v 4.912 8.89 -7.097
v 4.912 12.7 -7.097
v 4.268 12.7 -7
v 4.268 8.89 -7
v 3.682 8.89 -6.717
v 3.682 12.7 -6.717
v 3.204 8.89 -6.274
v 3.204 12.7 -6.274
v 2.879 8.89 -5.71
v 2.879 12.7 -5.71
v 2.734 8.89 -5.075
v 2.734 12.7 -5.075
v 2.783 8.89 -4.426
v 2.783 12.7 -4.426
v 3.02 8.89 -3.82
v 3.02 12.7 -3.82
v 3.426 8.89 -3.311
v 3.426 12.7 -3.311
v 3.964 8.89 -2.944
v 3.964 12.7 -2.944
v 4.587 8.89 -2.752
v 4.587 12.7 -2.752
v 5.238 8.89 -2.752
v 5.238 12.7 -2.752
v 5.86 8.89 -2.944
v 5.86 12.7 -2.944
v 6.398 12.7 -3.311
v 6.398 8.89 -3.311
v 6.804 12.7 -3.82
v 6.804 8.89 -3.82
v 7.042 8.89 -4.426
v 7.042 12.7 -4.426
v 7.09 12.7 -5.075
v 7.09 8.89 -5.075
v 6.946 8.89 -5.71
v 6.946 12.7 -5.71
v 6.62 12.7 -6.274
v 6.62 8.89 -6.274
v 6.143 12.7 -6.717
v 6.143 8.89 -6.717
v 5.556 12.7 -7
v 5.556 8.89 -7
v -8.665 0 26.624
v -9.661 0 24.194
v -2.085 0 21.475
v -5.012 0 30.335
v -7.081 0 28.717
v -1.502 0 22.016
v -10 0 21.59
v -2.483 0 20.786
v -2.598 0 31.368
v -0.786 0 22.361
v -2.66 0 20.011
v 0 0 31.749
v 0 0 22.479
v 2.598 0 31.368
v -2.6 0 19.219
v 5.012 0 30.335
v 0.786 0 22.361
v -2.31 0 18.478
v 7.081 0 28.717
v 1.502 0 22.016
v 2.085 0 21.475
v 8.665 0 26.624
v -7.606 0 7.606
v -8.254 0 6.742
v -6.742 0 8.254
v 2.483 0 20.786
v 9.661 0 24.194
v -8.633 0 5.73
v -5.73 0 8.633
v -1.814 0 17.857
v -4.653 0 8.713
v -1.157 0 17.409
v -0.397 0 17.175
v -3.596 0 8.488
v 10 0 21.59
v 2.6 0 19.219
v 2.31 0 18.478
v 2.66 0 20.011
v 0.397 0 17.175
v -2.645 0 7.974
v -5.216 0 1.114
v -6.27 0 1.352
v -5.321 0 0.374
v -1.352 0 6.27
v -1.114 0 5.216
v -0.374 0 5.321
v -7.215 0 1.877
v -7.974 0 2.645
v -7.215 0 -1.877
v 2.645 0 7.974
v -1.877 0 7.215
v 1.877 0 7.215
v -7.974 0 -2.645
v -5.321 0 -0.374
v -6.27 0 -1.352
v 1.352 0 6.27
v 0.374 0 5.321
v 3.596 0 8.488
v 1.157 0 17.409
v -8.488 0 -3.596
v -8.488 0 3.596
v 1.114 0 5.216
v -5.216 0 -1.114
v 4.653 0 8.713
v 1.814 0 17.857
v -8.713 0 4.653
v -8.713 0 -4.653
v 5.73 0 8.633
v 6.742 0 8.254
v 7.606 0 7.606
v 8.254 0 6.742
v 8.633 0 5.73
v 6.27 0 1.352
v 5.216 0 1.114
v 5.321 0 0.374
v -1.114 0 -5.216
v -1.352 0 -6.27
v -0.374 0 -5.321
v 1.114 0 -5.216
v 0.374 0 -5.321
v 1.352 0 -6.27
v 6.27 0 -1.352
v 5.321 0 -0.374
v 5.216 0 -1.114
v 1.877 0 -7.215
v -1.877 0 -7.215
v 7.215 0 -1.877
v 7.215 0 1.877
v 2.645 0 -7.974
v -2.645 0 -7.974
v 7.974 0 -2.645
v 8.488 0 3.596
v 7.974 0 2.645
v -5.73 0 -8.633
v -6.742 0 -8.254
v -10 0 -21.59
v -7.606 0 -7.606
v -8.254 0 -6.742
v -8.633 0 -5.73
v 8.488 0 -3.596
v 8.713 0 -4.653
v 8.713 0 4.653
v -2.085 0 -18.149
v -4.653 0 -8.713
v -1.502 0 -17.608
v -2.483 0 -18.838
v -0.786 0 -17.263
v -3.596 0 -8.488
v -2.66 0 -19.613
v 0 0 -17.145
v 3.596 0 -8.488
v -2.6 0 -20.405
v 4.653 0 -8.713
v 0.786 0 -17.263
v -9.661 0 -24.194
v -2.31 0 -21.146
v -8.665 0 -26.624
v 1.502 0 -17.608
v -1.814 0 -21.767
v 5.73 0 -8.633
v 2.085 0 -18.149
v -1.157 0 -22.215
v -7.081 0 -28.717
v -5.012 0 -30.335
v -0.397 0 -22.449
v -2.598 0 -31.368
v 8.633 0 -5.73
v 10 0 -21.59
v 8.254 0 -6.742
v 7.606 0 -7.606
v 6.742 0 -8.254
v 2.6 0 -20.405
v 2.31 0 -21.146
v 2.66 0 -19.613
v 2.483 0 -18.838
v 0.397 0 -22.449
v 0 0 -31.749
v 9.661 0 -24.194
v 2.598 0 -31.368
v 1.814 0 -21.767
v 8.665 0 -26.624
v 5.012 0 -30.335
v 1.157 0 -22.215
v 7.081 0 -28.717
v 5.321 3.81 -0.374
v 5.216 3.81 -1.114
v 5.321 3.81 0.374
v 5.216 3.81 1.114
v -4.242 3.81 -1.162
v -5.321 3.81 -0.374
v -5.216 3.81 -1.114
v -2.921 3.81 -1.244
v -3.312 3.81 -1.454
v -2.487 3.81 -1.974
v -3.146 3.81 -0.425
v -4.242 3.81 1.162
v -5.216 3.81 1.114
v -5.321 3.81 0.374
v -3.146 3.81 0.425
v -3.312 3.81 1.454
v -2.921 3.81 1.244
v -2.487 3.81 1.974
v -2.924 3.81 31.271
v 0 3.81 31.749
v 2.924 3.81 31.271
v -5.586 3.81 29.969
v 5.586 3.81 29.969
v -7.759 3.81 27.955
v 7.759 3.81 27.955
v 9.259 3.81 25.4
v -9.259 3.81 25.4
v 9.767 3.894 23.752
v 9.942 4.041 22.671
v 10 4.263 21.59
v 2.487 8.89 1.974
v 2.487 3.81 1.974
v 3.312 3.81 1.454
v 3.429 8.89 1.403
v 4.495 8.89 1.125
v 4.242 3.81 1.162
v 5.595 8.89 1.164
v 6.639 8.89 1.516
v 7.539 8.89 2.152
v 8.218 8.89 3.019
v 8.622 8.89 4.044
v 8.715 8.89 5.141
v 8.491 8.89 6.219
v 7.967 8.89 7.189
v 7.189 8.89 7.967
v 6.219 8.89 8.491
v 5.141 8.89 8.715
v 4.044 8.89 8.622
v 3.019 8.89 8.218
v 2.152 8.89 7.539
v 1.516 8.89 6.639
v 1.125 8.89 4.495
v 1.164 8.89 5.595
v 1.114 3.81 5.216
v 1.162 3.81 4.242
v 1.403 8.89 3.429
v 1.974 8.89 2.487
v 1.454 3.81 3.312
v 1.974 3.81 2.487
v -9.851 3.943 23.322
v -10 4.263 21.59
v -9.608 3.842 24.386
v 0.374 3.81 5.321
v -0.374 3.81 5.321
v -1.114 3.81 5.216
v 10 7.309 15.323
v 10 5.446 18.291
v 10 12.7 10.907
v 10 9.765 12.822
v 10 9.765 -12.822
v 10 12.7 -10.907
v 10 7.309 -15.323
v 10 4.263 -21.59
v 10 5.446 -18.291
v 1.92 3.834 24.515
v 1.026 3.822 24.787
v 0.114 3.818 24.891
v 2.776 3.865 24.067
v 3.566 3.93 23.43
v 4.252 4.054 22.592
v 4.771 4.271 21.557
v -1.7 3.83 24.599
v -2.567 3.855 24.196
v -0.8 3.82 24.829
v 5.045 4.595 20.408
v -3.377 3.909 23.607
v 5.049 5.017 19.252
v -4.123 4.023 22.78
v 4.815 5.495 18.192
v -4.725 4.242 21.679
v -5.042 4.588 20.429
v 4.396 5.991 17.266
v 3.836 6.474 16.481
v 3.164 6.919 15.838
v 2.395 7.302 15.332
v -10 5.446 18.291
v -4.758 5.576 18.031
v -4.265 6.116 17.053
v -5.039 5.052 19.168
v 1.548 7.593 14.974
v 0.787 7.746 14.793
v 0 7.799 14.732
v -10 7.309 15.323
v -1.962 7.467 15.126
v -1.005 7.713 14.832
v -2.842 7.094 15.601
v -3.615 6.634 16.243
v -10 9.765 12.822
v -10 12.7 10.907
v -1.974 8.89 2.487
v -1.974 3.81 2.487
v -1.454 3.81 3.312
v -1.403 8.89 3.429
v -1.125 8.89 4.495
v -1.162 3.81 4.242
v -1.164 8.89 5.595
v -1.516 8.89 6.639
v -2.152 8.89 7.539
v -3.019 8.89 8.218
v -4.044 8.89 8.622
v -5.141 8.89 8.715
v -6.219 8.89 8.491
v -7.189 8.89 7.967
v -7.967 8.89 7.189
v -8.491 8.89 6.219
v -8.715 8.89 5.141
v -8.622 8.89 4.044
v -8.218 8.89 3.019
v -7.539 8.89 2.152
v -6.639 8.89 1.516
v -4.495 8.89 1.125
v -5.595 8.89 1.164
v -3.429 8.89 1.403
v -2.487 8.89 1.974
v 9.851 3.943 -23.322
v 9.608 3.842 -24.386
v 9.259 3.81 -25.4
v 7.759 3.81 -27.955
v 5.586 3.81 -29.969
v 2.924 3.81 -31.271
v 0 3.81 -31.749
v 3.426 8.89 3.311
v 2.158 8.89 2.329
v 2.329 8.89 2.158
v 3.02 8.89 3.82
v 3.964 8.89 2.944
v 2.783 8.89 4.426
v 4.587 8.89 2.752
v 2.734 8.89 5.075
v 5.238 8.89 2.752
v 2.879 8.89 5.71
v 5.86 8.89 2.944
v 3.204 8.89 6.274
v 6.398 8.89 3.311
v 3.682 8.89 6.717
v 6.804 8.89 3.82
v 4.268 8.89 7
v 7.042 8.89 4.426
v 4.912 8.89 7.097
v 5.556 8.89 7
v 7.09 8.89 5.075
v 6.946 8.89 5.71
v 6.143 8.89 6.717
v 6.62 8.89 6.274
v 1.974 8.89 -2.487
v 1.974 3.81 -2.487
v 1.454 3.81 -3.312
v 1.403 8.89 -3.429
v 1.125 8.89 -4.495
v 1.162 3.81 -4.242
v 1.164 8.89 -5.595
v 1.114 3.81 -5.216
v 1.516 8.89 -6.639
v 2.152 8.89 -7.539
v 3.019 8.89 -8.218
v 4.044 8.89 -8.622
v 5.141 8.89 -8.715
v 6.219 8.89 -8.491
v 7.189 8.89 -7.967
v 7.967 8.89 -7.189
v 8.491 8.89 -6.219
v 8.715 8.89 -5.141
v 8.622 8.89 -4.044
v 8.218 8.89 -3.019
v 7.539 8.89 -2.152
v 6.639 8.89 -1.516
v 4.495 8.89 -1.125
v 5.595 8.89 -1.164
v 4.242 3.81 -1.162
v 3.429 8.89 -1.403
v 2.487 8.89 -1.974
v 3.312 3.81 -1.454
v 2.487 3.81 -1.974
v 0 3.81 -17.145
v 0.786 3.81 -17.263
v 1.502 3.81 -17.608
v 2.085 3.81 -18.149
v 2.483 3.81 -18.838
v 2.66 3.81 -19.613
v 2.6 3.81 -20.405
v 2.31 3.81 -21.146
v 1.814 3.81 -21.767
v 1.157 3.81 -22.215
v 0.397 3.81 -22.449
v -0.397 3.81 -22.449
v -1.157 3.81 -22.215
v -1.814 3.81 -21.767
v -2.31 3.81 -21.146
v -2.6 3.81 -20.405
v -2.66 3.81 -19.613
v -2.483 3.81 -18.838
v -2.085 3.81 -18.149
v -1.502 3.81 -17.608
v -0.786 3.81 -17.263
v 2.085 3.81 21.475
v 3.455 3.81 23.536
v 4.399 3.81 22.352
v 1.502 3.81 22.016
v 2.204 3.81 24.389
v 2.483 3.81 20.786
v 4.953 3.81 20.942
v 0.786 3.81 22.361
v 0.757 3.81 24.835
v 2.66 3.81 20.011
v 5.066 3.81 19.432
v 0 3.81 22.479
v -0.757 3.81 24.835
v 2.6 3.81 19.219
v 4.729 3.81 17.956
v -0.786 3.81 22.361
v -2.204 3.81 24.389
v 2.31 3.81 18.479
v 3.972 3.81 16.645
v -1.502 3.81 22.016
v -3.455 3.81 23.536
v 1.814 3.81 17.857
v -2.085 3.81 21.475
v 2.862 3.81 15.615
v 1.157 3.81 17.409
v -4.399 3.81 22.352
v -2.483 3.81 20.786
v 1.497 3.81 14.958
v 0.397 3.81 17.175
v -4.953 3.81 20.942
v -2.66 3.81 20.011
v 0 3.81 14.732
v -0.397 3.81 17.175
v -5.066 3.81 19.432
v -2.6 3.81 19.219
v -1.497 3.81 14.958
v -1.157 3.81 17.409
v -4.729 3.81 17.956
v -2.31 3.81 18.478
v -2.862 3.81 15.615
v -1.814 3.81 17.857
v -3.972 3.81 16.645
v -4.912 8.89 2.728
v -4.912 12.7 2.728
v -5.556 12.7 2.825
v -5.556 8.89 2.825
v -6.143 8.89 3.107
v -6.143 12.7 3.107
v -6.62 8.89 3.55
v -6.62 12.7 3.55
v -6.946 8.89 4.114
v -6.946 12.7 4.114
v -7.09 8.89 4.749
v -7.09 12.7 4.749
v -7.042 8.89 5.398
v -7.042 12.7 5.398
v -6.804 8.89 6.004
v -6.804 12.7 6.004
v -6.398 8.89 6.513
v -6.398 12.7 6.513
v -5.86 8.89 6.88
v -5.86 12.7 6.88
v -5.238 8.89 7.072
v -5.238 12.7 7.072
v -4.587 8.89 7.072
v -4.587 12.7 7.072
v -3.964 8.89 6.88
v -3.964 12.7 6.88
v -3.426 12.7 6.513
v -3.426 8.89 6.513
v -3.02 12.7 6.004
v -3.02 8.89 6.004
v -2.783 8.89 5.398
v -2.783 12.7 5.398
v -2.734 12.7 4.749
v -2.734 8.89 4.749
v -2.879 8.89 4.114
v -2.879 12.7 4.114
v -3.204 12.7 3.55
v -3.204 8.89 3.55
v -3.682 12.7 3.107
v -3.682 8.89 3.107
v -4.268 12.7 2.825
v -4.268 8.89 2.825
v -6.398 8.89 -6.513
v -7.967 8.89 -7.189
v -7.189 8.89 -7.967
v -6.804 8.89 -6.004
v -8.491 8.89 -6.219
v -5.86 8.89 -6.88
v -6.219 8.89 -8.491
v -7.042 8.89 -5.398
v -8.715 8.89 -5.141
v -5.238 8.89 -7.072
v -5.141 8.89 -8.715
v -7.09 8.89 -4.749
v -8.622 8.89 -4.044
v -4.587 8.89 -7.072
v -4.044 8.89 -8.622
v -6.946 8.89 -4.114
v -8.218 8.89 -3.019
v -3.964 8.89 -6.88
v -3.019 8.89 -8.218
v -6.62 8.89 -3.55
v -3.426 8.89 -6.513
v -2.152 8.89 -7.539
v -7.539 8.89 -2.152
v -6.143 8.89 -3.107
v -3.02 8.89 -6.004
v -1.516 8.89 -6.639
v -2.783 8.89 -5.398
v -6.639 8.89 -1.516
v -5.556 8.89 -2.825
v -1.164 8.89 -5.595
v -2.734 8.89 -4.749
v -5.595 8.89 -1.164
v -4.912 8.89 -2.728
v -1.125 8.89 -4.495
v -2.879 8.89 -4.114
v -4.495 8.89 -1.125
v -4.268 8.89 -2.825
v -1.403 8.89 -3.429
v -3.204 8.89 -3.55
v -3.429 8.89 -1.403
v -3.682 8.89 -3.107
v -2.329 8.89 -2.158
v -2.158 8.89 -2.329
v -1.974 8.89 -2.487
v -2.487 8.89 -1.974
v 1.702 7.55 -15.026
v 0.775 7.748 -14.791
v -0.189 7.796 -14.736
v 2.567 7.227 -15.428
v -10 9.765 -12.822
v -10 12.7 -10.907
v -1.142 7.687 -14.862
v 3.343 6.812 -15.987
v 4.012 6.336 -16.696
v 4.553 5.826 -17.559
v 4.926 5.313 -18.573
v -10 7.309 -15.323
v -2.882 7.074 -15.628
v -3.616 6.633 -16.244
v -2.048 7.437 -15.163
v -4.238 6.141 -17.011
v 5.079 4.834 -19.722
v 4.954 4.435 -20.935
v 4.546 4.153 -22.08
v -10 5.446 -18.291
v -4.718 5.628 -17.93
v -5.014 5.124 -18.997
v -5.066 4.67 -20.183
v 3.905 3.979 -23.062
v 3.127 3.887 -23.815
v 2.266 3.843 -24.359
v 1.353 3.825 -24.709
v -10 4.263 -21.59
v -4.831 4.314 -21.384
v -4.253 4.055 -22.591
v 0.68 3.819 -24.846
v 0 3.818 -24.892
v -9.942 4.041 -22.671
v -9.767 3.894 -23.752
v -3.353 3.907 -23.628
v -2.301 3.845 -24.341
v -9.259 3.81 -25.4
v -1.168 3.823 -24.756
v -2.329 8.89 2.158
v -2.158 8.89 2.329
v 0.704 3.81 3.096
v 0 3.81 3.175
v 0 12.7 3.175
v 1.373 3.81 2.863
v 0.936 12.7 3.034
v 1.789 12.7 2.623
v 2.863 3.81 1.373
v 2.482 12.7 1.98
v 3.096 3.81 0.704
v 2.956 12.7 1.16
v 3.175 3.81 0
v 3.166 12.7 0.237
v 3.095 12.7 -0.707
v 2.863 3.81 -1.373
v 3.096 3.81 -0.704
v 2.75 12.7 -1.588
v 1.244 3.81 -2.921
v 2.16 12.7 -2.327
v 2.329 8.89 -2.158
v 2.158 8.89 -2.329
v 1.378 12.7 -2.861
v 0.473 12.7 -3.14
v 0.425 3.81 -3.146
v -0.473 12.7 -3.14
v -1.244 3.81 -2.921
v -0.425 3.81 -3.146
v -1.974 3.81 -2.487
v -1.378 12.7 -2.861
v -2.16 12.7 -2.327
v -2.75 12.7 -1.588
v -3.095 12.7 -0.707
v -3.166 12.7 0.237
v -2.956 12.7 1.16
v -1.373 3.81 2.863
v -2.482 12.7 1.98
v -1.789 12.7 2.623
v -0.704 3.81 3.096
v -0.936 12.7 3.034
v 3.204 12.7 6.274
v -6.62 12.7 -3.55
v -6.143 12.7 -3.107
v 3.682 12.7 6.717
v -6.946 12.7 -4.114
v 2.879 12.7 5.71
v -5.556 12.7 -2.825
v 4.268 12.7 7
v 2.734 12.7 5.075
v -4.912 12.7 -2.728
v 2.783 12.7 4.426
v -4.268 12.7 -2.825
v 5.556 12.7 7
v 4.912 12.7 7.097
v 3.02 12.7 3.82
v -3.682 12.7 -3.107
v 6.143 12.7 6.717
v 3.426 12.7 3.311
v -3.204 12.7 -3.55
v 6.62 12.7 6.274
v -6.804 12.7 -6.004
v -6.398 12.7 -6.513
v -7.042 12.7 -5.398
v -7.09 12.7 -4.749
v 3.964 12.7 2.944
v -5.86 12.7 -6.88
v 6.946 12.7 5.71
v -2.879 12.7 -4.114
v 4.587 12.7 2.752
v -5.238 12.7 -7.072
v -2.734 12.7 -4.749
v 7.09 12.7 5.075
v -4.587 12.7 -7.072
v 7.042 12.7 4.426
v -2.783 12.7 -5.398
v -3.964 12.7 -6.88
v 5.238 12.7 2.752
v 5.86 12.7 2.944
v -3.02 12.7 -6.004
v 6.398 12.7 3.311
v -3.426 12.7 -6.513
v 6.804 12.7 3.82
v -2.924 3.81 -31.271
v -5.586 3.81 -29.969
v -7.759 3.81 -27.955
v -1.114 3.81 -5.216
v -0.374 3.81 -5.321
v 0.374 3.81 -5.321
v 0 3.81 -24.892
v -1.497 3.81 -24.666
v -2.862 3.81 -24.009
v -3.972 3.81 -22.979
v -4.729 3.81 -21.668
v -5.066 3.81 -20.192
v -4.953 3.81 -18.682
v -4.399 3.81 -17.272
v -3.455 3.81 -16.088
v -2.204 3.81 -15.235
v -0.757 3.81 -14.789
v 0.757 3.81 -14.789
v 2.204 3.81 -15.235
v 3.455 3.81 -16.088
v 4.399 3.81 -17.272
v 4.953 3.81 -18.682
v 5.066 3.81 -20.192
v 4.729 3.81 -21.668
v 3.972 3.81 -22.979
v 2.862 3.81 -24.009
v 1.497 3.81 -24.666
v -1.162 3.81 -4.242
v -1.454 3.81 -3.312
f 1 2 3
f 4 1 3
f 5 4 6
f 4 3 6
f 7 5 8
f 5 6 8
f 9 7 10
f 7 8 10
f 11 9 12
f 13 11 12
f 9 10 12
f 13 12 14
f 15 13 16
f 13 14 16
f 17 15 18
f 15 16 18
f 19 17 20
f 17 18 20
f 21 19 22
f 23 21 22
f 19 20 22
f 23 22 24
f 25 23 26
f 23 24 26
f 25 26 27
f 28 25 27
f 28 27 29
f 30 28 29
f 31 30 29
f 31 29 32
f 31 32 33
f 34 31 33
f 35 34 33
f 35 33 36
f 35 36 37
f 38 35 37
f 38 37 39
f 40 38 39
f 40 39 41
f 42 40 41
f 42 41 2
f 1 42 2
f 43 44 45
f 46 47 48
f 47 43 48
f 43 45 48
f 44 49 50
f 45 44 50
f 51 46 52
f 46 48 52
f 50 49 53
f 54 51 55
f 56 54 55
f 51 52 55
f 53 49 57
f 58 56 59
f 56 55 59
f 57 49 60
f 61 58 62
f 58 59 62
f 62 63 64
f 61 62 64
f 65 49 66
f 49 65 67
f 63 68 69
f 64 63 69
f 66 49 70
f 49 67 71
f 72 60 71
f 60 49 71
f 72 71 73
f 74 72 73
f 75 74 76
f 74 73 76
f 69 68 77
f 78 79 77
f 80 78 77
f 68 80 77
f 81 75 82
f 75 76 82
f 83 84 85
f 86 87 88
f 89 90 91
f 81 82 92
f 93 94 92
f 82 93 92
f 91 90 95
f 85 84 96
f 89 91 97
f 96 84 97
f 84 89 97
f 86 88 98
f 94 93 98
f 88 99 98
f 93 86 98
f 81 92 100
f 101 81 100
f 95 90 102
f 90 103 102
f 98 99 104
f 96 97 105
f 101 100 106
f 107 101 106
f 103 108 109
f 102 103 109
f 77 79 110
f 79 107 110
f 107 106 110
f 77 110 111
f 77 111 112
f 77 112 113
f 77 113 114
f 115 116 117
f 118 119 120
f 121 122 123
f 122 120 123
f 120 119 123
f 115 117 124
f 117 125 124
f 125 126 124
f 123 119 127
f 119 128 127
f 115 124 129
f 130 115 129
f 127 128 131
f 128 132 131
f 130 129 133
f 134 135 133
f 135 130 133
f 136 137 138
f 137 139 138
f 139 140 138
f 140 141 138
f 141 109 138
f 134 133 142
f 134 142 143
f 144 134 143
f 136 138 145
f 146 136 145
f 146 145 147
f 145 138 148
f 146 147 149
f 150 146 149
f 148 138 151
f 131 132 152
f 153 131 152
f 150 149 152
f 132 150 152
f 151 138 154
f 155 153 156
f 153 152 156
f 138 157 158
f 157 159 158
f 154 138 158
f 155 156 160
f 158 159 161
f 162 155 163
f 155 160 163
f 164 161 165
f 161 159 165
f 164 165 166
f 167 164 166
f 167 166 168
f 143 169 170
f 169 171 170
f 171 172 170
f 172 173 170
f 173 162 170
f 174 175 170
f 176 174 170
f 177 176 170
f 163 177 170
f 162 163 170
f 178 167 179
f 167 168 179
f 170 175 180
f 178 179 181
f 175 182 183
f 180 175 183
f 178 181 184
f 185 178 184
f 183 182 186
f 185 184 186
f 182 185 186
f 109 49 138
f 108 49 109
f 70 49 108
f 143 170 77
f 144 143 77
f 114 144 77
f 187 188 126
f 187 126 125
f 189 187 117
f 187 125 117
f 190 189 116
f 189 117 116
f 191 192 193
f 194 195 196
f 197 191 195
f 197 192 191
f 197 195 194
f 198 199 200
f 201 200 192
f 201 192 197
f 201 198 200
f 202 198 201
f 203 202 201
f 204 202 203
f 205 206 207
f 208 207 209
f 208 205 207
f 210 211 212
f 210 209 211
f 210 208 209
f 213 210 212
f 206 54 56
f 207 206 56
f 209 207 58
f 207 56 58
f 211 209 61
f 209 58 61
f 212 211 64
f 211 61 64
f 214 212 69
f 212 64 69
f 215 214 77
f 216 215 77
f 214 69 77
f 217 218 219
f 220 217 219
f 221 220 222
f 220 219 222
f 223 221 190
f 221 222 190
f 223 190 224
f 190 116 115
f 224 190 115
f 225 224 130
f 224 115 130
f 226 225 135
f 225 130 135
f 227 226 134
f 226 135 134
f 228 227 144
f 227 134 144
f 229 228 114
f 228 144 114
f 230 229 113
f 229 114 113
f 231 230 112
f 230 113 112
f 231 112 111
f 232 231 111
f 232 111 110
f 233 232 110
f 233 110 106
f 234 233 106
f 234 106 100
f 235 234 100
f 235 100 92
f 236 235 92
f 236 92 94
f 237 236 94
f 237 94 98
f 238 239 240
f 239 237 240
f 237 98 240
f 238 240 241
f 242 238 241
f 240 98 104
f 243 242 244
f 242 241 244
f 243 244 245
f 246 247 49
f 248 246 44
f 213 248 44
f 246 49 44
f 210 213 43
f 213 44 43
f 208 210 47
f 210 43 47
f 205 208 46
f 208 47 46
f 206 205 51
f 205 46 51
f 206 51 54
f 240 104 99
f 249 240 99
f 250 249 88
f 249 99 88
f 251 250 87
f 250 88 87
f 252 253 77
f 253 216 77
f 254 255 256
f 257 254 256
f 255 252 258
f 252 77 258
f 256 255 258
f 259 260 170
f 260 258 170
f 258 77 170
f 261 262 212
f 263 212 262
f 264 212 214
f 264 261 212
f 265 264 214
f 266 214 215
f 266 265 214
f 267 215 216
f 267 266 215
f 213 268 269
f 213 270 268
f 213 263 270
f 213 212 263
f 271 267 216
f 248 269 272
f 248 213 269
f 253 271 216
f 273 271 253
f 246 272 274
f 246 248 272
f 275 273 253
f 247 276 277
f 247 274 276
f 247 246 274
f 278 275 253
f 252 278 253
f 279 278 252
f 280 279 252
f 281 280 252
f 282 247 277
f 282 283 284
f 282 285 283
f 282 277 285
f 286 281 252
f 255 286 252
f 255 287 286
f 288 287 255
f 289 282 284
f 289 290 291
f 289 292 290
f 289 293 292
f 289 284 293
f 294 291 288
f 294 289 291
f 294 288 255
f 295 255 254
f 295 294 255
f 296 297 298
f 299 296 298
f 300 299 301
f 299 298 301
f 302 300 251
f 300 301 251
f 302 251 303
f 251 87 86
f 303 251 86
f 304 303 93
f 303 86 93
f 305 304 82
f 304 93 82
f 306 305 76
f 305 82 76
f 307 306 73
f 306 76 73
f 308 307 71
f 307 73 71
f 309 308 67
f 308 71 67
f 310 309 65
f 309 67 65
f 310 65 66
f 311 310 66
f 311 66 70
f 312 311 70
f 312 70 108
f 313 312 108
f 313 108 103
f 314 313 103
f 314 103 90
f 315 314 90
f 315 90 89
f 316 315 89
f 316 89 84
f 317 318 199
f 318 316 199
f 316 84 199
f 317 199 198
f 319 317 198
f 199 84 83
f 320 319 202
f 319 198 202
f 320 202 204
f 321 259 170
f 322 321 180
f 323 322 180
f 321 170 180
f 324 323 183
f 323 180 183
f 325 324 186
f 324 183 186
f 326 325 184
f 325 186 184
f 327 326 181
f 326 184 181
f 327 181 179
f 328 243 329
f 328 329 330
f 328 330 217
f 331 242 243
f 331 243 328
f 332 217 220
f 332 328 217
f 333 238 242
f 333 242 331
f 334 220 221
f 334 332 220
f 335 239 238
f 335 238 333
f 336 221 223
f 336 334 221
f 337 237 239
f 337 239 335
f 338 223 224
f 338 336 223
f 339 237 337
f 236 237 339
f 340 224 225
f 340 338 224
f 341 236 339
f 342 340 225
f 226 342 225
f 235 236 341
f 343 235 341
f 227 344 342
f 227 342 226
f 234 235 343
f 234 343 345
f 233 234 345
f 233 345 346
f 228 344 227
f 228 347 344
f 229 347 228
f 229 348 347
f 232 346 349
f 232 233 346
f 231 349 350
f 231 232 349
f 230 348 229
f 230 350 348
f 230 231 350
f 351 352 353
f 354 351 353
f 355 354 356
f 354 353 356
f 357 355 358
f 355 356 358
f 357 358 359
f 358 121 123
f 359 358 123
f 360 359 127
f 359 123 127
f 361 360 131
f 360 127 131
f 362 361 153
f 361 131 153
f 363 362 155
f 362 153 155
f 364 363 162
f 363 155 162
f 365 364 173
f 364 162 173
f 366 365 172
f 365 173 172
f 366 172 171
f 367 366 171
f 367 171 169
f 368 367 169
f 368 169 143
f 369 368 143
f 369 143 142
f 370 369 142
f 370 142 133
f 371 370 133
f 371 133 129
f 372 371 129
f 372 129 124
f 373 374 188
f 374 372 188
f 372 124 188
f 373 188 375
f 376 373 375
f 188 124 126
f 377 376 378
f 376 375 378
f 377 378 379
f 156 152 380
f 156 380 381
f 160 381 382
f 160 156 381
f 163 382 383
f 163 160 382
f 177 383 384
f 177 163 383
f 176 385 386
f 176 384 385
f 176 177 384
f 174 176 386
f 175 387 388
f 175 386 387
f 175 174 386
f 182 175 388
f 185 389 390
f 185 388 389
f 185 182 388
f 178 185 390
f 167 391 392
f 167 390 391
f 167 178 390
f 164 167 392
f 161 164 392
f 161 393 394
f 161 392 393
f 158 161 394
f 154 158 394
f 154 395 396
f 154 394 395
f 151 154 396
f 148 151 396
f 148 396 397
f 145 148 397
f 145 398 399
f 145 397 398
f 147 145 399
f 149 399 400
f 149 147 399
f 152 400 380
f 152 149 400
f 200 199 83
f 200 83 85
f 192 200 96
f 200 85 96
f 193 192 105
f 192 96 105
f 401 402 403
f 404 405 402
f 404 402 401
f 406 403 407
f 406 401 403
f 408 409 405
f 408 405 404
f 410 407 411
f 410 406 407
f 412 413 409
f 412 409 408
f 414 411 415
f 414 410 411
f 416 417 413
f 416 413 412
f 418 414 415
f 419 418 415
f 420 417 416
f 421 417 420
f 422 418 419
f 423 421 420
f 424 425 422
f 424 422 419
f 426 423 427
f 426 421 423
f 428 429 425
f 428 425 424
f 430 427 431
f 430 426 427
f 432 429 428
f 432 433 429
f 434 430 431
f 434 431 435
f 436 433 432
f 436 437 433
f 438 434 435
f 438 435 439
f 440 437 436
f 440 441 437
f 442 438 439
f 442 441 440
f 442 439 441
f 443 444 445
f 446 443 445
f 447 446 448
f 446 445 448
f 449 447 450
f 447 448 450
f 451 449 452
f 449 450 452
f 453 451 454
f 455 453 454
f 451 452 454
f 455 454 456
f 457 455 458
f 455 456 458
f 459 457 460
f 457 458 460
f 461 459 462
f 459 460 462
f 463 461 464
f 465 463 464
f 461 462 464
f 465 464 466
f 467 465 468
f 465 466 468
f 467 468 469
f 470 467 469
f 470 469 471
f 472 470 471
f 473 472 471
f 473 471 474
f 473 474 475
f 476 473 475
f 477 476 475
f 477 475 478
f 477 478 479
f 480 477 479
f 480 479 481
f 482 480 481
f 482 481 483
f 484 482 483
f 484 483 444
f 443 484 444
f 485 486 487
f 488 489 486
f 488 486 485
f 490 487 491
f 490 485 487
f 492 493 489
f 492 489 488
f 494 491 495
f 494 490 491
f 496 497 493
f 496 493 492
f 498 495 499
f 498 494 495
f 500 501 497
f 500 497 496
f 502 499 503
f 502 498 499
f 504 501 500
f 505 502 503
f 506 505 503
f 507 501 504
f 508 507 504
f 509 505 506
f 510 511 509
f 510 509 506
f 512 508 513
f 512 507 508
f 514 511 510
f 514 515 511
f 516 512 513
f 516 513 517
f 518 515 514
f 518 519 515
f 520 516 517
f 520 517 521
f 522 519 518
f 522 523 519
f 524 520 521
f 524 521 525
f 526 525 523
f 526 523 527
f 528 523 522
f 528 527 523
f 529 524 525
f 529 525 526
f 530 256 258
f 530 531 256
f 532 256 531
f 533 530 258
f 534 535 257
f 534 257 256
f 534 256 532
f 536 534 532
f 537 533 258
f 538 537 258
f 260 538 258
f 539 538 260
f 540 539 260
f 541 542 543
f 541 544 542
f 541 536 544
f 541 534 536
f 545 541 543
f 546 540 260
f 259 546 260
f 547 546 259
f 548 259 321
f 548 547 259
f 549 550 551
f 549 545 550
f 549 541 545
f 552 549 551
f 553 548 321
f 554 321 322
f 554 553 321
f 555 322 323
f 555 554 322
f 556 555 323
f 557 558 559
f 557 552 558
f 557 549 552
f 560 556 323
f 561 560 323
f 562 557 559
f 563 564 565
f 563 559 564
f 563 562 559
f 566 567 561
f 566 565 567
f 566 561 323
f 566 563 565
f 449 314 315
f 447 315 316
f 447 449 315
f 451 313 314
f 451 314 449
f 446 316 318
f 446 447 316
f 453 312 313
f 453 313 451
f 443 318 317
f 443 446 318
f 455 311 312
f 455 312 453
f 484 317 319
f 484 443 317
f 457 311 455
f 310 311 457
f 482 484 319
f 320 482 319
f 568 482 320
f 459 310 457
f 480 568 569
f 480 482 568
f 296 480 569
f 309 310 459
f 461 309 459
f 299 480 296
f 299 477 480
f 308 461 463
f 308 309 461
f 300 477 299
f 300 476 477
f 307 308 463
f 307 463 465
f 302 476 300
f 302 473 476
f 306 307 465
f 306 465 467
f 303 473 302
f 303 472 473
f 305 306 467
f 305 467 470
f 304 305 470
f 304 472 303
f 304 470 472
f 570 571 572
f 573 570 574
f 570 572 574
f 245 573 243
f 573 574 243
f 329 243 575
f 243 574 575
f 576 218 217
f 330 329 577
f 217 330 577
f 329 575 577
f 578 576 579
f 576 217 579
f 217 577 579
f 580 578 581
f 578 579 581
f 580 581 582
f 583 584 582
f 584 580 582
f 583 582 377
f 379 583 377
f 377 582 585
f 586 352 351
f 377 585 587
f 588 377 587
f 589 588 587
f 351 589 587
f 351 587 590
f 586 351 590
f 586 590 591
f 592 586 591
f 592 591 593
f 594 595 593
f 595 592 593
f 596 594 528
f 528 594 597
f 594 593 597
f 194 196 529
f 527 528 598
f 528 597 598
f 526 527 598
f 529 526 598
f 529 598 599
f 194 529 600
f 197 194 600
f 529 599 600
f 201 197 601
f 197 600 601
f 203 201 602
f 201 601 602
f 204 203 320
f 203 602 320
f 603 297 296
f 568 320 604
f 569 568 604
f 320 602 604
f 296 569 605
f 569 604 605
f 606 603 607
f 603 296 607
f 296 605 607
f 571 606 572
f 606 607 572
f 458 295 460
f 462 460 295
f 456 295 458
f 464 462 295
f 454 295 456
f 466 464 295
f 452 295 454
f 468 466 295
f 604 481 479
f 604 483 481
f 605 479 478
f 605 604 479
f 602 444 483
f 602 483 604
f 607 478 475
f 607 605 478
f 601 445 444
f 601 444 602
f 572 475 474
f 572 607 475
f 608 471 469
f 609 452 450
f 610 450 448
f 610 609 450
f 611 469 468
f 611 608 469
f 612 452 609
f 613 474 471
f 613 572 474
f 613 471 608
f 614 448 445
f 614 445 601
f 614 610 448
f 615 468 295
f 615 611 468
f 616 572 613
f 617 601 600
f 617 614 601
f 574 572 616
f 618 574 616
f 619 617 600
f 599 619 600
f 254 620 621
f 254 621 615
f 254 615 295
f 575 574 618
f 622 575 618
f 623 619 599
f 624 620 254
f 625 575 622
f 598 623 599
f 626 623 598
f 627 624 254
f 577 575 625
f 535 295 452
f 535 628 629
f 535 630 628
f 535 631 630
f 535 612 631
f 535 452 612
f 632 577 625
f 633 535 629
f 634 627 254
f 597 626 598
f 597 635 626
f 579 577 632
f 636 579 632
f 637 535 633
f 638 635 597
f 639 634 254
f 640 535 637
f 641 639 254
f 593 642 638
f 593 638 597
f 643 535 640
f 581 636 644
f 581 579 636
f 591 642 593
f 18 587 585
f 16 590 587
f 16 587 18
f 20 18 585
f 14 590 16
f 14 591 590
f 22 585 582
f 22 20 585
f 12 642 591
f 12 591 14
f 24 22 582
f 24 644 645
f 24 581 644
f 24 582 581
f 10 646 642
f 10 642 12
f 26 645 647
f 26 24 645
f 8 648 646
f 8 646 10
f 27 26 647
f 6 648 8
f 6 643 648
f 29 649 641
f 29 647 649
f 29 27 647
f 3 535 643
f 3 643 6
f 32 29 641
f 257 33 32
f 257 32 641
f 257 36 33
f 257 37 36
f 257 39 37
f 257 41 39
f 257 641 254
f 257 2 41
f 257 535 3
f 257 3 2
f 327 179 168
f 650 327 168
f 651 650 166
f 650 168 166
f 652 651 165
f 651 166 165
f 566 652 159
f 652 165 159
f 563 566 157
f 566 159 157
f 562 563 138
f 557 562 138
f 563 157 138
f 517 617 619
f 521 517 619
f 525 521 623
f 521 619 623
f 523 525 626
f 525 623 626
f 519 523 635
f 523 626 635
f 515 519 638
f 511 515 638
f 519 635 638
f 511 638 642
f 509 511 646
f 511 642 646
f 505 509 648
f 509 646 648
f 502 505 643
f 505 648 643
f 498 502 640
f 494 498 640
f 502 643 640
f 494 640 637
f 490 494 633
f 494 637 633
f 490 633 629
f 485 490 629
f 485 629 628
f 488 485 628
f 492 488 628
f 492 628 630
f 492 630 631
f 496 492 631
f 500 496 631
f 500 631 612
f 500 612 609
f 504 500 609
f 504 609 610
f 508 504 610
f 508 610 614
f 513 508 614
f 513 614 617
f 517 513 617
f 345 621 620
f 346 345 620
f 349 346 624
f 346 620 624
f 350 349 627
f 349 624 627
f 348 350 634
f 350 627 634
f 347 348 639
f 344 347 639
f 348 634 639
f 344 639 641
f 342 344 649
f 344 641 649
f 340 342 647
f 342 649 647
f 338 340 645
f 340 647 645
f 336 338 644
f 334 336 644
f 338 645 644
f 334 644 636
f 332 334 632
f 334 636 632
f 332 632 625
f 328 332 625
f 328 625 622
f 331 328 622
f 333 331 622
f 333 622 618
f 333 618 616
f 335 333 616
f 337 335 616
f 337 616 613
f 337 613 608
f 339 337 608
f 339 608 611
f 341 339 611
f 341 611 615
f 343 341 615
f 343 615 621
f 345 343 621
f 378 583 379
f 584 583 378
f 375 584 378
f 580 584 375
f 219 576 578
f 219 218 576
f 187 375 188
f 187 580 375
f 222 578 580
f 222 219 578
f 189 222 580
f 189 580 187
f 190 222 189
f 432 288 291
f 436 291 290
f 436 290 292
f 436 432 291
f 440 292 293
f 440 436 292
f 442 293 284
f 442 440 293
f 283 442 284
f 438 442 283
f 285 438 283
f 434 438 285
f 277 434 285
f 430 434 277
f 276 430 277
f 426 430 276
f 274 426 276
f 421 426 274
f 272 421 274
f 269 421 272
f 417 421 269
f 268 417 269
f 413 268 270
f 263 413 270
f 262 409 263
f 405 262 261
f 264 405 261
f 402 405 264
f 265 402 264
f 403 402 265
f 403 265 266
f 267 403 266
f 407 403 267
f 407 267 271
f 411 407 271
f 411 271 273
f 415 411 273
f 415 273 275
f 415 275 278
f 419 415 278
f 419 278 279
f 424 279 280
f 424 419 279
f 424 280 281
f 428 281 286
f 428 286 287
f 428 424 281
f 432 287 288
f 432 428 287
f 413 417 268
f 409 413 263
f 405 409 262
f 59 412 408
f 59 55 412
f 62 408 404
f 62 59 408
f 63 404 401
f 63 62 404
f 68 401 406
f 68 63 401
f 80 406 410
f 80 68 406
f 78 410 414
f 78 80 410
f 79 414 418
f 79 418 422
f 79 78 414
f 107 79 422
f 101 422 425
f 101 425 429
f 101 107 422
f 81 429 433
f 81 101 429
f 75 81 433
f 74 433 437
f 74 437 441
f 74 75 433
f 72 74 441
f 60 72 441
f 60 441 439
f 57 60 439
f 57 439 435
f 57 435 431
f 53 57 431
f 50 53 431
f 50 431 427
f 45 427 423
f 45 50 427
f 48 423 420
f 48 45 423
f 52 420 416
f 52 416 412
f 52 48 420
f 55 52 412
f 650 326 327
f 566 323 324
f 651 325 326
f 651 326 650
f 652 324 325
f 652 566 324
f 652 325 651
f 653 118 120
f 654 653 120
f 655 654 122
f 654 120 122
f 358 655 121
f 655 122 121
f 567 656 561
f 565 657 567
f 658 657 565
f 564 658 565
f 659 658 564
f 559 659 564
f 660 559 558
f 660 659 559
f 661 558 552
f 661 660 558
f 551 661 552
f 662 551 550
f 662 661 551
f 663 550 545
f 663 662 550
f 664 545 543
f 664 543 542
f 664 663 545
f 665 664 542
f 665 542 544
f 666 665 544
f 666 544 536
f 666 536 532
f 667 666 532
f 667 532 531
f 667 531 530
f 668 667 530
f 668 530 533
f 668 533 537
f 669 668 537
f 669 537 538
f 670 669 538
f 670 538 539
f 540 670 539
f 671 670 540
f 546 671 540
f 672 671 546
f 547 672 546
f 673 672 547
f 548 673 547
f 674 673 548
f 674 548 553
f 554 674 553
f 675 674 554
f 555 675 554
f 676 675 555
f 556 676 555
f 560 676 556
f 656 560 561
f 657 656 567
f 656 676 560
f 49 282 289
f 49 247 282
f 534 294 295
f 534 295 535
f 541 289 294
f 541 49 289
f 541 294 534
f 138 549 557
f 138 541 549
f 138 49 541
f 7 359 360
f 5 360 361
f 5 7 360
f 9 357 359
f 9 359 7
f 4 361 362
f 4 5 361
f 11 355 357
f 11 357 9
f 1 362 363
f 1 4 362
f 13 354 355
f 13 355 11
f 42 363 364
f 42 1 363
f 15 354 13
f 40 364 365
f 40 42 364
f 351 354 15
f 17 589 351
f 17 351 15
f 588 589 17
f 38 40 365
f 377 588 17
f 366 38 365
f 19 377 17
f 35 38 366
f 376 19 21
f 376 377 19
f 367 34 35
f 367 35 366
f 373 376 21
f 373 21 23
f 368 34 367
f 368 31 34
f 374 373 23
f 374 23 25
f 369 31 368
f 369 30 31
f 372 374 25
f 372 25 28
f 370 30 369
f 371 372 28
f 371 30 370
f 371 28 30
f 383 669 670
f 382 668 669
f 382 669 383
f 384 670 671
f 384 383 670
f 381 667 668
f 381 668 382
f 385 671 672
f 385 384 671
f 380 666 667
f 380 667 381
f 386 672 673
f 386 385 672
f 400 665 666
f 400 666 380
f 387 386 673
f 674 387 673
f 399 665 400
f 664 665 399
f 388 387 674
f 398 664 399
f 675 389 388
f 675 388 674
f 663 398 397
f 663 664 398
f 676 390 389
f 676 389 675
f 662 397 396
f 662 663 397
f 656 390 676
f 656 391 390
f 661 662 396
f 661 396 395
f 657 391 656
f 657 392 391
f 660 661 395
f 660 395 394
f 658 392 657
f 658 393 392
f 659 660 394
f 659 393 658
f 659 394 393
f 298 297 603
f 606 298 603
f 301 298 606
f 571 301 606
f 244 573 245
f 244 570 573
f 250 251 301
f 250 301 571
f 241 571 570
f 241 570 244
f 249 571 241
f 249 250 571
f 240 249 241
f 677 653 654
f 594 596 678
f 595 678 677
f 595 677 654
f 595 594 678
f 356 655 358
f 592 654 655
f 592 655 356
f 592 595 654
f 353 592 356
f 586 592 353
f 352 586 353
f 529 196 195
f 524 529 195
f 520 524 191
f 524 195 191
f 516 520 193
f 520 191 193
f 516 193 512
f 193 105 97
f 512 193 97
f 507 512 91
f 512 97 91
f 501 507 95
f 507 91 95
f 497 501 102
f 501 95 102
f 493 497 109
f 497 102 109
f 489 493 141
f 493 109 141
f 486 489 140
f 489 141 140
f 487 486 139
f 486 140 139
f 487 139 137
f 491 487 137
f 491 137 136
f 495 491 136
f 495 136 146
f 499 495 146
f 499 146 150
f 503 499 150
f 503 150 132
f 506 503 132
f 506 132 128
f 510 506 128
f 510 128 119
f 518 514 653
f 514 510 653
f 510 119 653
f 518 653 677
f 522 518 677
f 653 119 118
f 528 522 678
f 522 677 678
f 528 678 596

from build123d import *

# Parameters (mm, degrees)
SKETCH1_W               = 20
SKETCH1_H               = 63.5
BOSS_EXTRUDE1_DEPTH     = 12.7
SKETCH2_R               = 3.175
SKETCH2_R_2             = 2.1844
CUT_EXTRUDE1_DEPTH      = 36.62797356
CUT_EXTRUDE2_DEPTH      = 36.62797356
CUT_EXTRUDE2_DEPTH_BACK = 36.62797356
SKETCH4_R               = 3.81
CUT_EXTRUDE3_DEPTH      = 8.89
SKETCH4_3_R             = 3.81
SKETCH4_3_R_2           = 2.1844
SKETCH4_3_R_3           = 5.334
SKETCH4_3_R_4           = 3.175
CUT_EXTRUDE4_DEPTH      = 3.81
CUT_EXTRUDE5_REACH      = 36.454
SKETCH6_R               = 5.08
SKETCH6_R_2             = 2.667
CUT_EXTRUDE6_DEPTH      = 10
CUT_EXTRUDE6_DEPTH_BACK = 35.454239272
SKETCH6_4_R             = 2.159
SKETCH6_4_R_2           = 2.667
FILLET1_R               = 10.16


with BuildPart() as part:
    # Sketch1 → Boss-Extrude1 (new body)
    with BuildSketch(Plane(origin=(0, 0, 0), x_dir=(1, 0, 0), z_dir=(0, 1, 0))):
        Rectangle(SKETCH1_W, SKETCH1_H)
    extrude(amount=BOSS_EXTRUDE1_DEPTH)

    # Sketch2 → Cut-Extrude1 (cut, through all)
    with BuildSketch(Plane(origin=(0, 12.7, 0), x_dir=(1, 0, 0), z_dir=(0, 1, 0))):
        with Locations(Location((0, 0, 0), (0, 0, 270))):
            Circle(SKETCH2_R)
        with Locations(Location((-4.912200098, 4.912200098, 0), (0, 0, 270))):
            Circle(SKETCH2_R_2)
        with Locations(Location((4.912200098, -4.912200098, 0), (0, 0, 270))):
            Circle(SKETCH2_R_2)
        with Locations(Location((4.912200098, 4.912200098, 0), (0, 0, 90))):
            Circle(SKETCH2_R_2)
        with Locations(Location((-4.912200098, -4.912200098, 0), (0, 0, 90))):
            Circle(SKETCH2_R_2)
    extrude(amount=-CUT_EXTRUDE1_DEPTH, mode=Mode.SUBTRACT)

    # Sketch3 → Cut-Extrude2 (cut, two sides: drawn at the far end of the back side and taken through both)
    with BuildSketch(Plane(origin=(0, 0, 0), x_dir=(0, 0, -1), z_dir=(1, 0, 0)).offset(-CUT_EXTRUDE2_DEPTH_BACK)):
        with BuildLine():
            Line((31.75, 3.81), (31.75, 12.7))
            Line((31.75, 12.7), (10.906600098, 12.7))
            ThreePointArc((10.906600098, 12.7), (16.898665682, 6.209564949), (25.4, 3.81))
            Line((25.4, 3.81), (31.75, 3.81))
        make_face()
        with BuildLine():
            ThreePointArc((-25.4, 3.81), (-16.898665682, 6.209564949), (-10.906600098, 12.7))
            Line((-10.906600098, 12.7), (-31.75, 12.7))
            Line((-31.75, 12.7), (-31.75, 3.81))
            Line((-31.75, 3.81), (-25.4, 3.81))
        make_face()
    extrude(amount=CUT_EXTRUDE2_DEPTH + CUT_EXTRUDE2_DEPTH_BACK, mode=Mode.SUBTRACT)

    # Sketch4 → Cut-Extrude3 (cut)
    with BuildSketch(Plane.XZ):
        with Locations((-4.912200098, -4.912200098)):
            Circle(SKETCH4_R)
        with Locations((4.912200098, 4.912200098)):
            Circle(SKETCH4_R)
        with Locations((-4.912200098, 4.912200098)):
            Circle(SKETCH4_R)
        with Locations((4.912200098, -4.912200098)):
            Circle(SKETCH4_R)
    extrude(amount=-CUT_EXTRUDE3_DEPTH, mode=Mode.SUBTRACT)

    # Sketch4<3> → Cut-Extrude4 (cut)
    # profile 1 of 28: a face of its own
    with BuildSketch(Plane.XZ):
        with Locations((-4.912200098, 4.912200098)):
            Circle(SKETCH4_3_R)
        with Locations(Location((-4.912200098, 4.912200098, 0), (0, 0, 270))):
            Circle(SKETCH4_3_R_2, mode=Mode.SUBTRACT)
    # profile 2 of 28: a face of its own
    with BuildSketch(Plane.XZ):
        Circle(SKETCH4_3_R_3)
        with Locations(Location((0, 0, 0), (0, 0, 90))):
            Circle(SKETCH4_3_R_4, mode=Mode.SUBTRACT)
    # profile 3 of 28: a face of its own
    with BuildSketch(Plane.XZ):
        Circle(SKETCH4_3_R_3)
    # profile 4 of 28: a face of its own
    with BuildSketch(Plane.XZ):
        with Locations(Location((-4.912200098, 4.912200098, 0), (0, 0, 270))):
            Circle(SKETCH4_3_R_2)
    # profile 5 of 28: a face of its own
    with BuildSketch(Plane.XZ):
        with Locations((-4.912200098, 4.912200098)):
            Circle(SKETCH4_3_R)
    # profile 6 of 28: a face of its own
    with BuildSketch(Plane.XZ):
        Circle(SKETCH4_3_R_3)
        with Locations(Location((0, 0, 0), (0, 0, 90))):
            Circle(SKETCH4_3_R_4, mode=Mode.SUBTRACT)
    # profile 7 of 28: a face of its own
    with BuildSketch(Plane.XZ):
        with Locations((-4.912200098, -4.912200098)):
            Circle(SKETCH4_3_R)
    # profile 8 of 28: a face of its own
    with BuildSketch(Plane.XZ):
        Circle(SKETCH4_3_R_3)
        with Locations(Location((0, 0, 0), (0, 0, 90))):
            Circle(SKETCH4_3_R_4, mode=Mode.SUBTRACT)
    # profile 9 of 28: a face of its own
    with BuildSketch(Plane.XZ):
        with Locations((-4.912200098, -4.912200098)):
            Circle(SKETCH4_3_R)
        with Locations(Location((-4.912200098, -4.912200098, 0), (0, 0, 90))):
            Circle(SKETCH4_3_R_2, mode=Mode.SUBTRACT)
    # profile 10 of 28: a face of its own
    with BuildSketch(Plane.XZ):
        Circle(SKETCH4_3_R_3)
    # profile 11 of 28: a face of its own
    with BuildSketch(Plane.XZ):
        with Locations(Location((-4.912200098, -4.912200098, 0), (0, 0, 90))):
            Circle(SKETCH4_3_R_2)
    # profile 12 of 28: a face of its own
    with BuildSketch(Plane.XZ):
        with BuildLine():
            ThreePointArc((1.973854475, -2.486870224), (1.04518229, -2.998035854), (0, -3.175))
            Line((0, -3.175), (0, -5.334))
            ThreePointArc((0, -5.334), (0.560277089, -5.304492962), (1.114355409, -5.216298306))
            ThreePointArc((1.114355409, -5.216298306), (1.278123958, -3.767826643), (1.973854475, -2.486870224))
        make_face()
    # profile 13 of 28: a face of its own
    with BuildSketch(Plane.XZ):
        with BuildLine():
            Line((0, -5.334), (0, -3.175))
            ThreePointArc((0, -3.175), (-1.04518229, -2.998035854), (-1.973854475, -2.486870224))
            ThreePointArc((-1.973854475, -2.486870224), (-1.326729639, -3.623595587), (-1.102200098, -4.912200098))
            ThreePointArc((-1.102200098, -4.912200098), (-1.105240139, -5.064370621), (-1.114355409, -5.216298306))
            ThreePointArc((-1.114355409, -5.216298306), (-0.560277089, -5.304492962), (0, -5.334))
        make_face()
    # profile 14 of 28: a face of its own
    with BuildSketch(Plane.XZ):
        with Locations((4.912200098, -4.912200098)):
            Circle(SKETCH4_3_R)
        with Locations(Location((4.912200098, -4.912200098, 0), (0, 0, 270))):
            Circle(SKETCH4_3_R_2, mode=Mode.SUBTRACT)
    # profile 15 of 28: a face of its own
    with BuildSketch(Plane.XZ):
        Circle(SKETCH4_3_R_3)
        with Locations(Location((0, 0, 0), (0, 0, 90))):
            Circle(SKETCH4_3_R_4, mode=Mode.SUBTRACT)
    # profile 16 of 28: a face of its own
    with BuildSketch(Plane.XZ):
        Circle(SKETCH4_3_R_3)
    # profile 17 of 28: a face of its own
    with BuildSketch(Plane.XZ):
        with Locations(Location((4.912200098, -4.912200098, 0), (0, 0, 270))):
            Circle(SKETCH4_3_R_2)
    # profile 18 of 28: a face of its own
    with BuildSketch(Plane.XZ):
        with Locations((4.912200098, -4.912200098)):
            Circle(SKETCH4_3_R)
    # profile 19 of 28: a face of its own
    with BuildSketch(Plane.XZ):
        Circle(SKETCH4_3_R_3)
        with Locations(Location((0, 0, 0), (0, 0, 90))):
            Circle(SKETCH4_3_R_4, mode=Mode.SUBTRACT)
    # profile 20 of 28: a face of its own
    with BuildSketch(Plane.XZ):
        with Locations((4.912200098, 4.912200098)):
            Circle(SKETCH4_3_R)
    # profile 21 of 28: a face of its own
    with BuildSketch(Plane.XZ):
        Circle(SKETCH4_3_R_3)
        with Locations(Location((0, 0, 0), (0, 0, 90))):
            Circle(SKETCH4_3_R_4, mode=Mode.SUBTRACT)
    # profile 22 of 28: a face of its own
    with BuildSketch(Plane.XZ):
        with Locations((4.912200098, 4.912200098)):
            Circle(SKETCH4_3_R)
        with Locations(Location((4.912200098, 4.912200098, 0), (0, 0, 90))):
            Circle(SKETCH4_3_R_2, mode=Mode.SUBTRACT)
    # profile 23 of 28: a face of its own
    with BuildSketch(Plane.XZ):
        Circle(SKETCH4_3_R_3)
    # profile 24 of 28: a face of its own
    with BuildSketch(Plane.XZ):
        with Locations(Location((4.912200098, 4.912200098, 0), (0, 0, 90))):
            Circle(SKETCH4_3_R_2)
    # profile 25 of 28: a face of its own
    with BuildSketch(Plane.XZ):
        with BuildLine():
            Line((0, 3.175), (0, 5.334))
            ThreePointArc((0, 5.334), (-0.560277089, 5.304492962), (-1.114355409, 5.216298306))
            ThreePointArc((-1.114355409, 5.216298306), (-1.105240139, 5.064370621), (-1.102200098, 4.912200098))
            ThreePointArc((-1.102200098, 4.912200098), (-1.326729639, 3.623595587), (-1.973854475, 2.486870224))
            ThreePointArc((-1.973854475, 2.486870224), (-1.04518229, 2.998035854), (0, 3.175))
        make_face()
    # profile 26 of 28: a face of its own
    with BuildSketch(Plane.XZ):
        with BuildLine():
            ThreePointArc((1.114355409, 5.216298306), (0.560277089, 5.304492962), (0, 5.334))
            Line((0, 5.334), (0, 3.175))
            ThreePointArc((0, 3.175), (1.04518229, 2.998035854), (1.973854475, 2.486870224))
            ThreePointArc((1.973854475, 2.486870224), (1.278123958, 3.767826643), (1.114355409, 5.216298306))
        make_face()
    # profile 27 of 28: a face of its own
    with BuildSketch(Plane.XZ):
        with BuildLine():
            ThreePointArc((1.973854475, 2.486870224), (1.04518229, 2.998035854), (0, 3.175))
            Line((0, 3.175), (0, -3.175))
            ThreePointArc((0, -3.175), (1.04518229, -2.998035854), (1.973854475, -2.486870224))
            ThreePointArc((1.973854475, -2.486870224), (2.218123262, -2.218123262), (2.486870224, -1.973854475))
            ThreePointArc((2.486870224, -1.973854475), (2.998035854, -1.04518229), (3.175, 0))
            ThreePointArc((3.175, 0), (2.998035854, 1.04518229), (2.486870224, 1.973854475))
            ThreePointArc((2.486870224, 1.973854475), (2.218123262, 2.218123262), (1.973854475, 2.486870224))
        make_face()
    # profile 28 of 28: a face of its own
    with BuildSketch(Plane.XZ):
        with BuildLine():
            Line((0, -3.175), (0, 3.175))
            ThreePointArc((0, 3.175), (-1.04518229, 2.998035854), (-1.973854475, 2.486870224))
            ThreePointArc((-1.973854475, 2.486870224), (-2.218123262, 2.218123262), (-2.486870224, 1.973854475))
            ThreePointArc((-2.486870224, 1.973854475), (-3.175, 0), (-2.486870224, -1.973854475))
            ThreePointArc((-2.486870224, -1.973854475), (-2.218123262, -2.218123262), (-1.973854475, -2.486870224))
            ThreePointArc((-1.973854475, -2.486870224), (-1.04518229, -2.998035854), (0, -3.175))
        make_face()
    extrude(amount=-CUT_EXTRUDE4_DEPTH, mode=Mode.SUBTRACT)

    # Cut-Extrude5: up to this face of the body (flat: up to its plane)
    cut_extrude5_end = Plane(part.part.faces().sort_by_distance((9.704058164, 12.7, 0))[0])
    # Sketch6 → Cut-Extrude5 (cut, up to the picked face)
    with BuildSketch(Plane(origin=(0, 3.81, 0), x_dir=(1, 0, 0), z_dir=(0, 1, 0)), mode=Mode.PRIVATE) as cut_extrude5_sk1:
        with Locations(Location((0, 19.812, 0), (0, 0, 90))):
            Circle(SKETCH6_R)
    cut_extrude5_tool1 = split(extrude(cut_extrude5_sk1.sketch, amount=CUT_EXTRUDE5_REACH, mode=Mode.PRIVATE), bisect_by=cut_extrude5_end, keep=Keep.BOTH, mode=Mode.PRIVATE)
    # Sketch6 → Cut-Extrude5 (cut, up to the picked face)
    with BuildSketch(Plane(origin=(0, 3.81, 0), x_dir=(1, 0, 0), z_dir=(0, 1, 0)), mode=Mode.PRIVATE) as cut_extrude5_sk2:
        with Locations(Location((0, -19.812, 0), (0, 0, 90))):
            Circle(SKETCH6_R)
        with Locations(Location((0, -19.812, 0), (0, 0, 90))):
            Circle(SKETCH6_R_2, mode=Mode.SUBTRACT)
    cut_extrude5_tool2 = split(extrude(cut_extrude5_sk2.sketch, amount=CUT_EXTRUDE5_REACH, mode=Mode.PRIVATE), bisect_by=cut_extrude5_end, keep=Keep.BOTH, mode=Mode.PRIVATE)
    add(cut_extrude5_tool1.solids().sort_by(Axis((0, 3.81, -19.812), (0, 1, 0)))[0], mode=Mode.SUBTRACT)
    add(cut_extrude5_tool2.solids().sort_by(Axis((0, 3.81, 24.748316), (0, 1, 0)))[0], mode=Mode.SUBTRACT)

    # Sketch6<4> → Cut-Extrude6 (cut, two sides: drawn at the far end of the back side and taken through both)
    with BuildSketch(Plane(origin=(0, 3.81, 0), x_dir=(1, 0, 0), z_dir=(0, 1, 0)).offset(-CUT_EXTRUDE6_DEPTH_BACK)):
        with Locations((0, 19.812)):
            Circle(SKETCH6_4_R)
        with Locations((0, -19.812)):
            Circle(SKETCH6_4_R)
        with Locations(Location((0, 19.812, 0), (0, 0, 270))):
            Circle(SKETCH6_4_R_2)
        with Locations(Location((0, -19.812, 0), (0, 0, 270))):
            Circle(SKETCH6_4_R_2)
    extrude(amount=CUT_EXTRUDE6_DEPTH + CUT_EXTRUDE6_DEPTH_BACK, mode=Mode.SUBTRACT)

    # Fillet1
    # the kernel refuses this fillet: 10.16 mm, written as the material it takes off along each edge
    with BuildSketch(Plane(origin=(10, -25.4, 31.75), x_dir=(0, 0, -1), z_dir=(0, 1, 0)), Plane(origin=(10, -25.4, -31.75), x_dir=(-1, 0, 0), z_dir=(0, 1, 0)), Plane(origin=(-10, -25.4, 31.75), x_dir=(1, 0, 0), z_dir=(0, 1, 0))) as fillet1_piece_1:
        with BuildLine():
            CenterArc((FILLET1_R, FILLET1_R), FILLET1_R, 180, 90)
            Line((0, FILLET1_R), (0, 0))
            Line((0, 0), (FILLET1_R, 0))
        make_face()
    extrude(amount=54.61, mode=Mode.SUBTRACT)
    with BuildSketch(Plane(origin=(-10, -25.4, -31.75), x_dir=(1, 0, 0), z_dir=(0, 1, 0))) as fillet1_piece_2:
        with BuildLine():
            CenterArc((FILLET1_R, -FILLET1_R), FILLET1_R, 90, 90)
            Line((0, -FILLET1_R), (0, 0))
            Line((0, 0), (FILLET1_R, 0))
        make_face()
    extrude(amount=54.61, mode=Mode.SUBTRACT)


solid = part.part
